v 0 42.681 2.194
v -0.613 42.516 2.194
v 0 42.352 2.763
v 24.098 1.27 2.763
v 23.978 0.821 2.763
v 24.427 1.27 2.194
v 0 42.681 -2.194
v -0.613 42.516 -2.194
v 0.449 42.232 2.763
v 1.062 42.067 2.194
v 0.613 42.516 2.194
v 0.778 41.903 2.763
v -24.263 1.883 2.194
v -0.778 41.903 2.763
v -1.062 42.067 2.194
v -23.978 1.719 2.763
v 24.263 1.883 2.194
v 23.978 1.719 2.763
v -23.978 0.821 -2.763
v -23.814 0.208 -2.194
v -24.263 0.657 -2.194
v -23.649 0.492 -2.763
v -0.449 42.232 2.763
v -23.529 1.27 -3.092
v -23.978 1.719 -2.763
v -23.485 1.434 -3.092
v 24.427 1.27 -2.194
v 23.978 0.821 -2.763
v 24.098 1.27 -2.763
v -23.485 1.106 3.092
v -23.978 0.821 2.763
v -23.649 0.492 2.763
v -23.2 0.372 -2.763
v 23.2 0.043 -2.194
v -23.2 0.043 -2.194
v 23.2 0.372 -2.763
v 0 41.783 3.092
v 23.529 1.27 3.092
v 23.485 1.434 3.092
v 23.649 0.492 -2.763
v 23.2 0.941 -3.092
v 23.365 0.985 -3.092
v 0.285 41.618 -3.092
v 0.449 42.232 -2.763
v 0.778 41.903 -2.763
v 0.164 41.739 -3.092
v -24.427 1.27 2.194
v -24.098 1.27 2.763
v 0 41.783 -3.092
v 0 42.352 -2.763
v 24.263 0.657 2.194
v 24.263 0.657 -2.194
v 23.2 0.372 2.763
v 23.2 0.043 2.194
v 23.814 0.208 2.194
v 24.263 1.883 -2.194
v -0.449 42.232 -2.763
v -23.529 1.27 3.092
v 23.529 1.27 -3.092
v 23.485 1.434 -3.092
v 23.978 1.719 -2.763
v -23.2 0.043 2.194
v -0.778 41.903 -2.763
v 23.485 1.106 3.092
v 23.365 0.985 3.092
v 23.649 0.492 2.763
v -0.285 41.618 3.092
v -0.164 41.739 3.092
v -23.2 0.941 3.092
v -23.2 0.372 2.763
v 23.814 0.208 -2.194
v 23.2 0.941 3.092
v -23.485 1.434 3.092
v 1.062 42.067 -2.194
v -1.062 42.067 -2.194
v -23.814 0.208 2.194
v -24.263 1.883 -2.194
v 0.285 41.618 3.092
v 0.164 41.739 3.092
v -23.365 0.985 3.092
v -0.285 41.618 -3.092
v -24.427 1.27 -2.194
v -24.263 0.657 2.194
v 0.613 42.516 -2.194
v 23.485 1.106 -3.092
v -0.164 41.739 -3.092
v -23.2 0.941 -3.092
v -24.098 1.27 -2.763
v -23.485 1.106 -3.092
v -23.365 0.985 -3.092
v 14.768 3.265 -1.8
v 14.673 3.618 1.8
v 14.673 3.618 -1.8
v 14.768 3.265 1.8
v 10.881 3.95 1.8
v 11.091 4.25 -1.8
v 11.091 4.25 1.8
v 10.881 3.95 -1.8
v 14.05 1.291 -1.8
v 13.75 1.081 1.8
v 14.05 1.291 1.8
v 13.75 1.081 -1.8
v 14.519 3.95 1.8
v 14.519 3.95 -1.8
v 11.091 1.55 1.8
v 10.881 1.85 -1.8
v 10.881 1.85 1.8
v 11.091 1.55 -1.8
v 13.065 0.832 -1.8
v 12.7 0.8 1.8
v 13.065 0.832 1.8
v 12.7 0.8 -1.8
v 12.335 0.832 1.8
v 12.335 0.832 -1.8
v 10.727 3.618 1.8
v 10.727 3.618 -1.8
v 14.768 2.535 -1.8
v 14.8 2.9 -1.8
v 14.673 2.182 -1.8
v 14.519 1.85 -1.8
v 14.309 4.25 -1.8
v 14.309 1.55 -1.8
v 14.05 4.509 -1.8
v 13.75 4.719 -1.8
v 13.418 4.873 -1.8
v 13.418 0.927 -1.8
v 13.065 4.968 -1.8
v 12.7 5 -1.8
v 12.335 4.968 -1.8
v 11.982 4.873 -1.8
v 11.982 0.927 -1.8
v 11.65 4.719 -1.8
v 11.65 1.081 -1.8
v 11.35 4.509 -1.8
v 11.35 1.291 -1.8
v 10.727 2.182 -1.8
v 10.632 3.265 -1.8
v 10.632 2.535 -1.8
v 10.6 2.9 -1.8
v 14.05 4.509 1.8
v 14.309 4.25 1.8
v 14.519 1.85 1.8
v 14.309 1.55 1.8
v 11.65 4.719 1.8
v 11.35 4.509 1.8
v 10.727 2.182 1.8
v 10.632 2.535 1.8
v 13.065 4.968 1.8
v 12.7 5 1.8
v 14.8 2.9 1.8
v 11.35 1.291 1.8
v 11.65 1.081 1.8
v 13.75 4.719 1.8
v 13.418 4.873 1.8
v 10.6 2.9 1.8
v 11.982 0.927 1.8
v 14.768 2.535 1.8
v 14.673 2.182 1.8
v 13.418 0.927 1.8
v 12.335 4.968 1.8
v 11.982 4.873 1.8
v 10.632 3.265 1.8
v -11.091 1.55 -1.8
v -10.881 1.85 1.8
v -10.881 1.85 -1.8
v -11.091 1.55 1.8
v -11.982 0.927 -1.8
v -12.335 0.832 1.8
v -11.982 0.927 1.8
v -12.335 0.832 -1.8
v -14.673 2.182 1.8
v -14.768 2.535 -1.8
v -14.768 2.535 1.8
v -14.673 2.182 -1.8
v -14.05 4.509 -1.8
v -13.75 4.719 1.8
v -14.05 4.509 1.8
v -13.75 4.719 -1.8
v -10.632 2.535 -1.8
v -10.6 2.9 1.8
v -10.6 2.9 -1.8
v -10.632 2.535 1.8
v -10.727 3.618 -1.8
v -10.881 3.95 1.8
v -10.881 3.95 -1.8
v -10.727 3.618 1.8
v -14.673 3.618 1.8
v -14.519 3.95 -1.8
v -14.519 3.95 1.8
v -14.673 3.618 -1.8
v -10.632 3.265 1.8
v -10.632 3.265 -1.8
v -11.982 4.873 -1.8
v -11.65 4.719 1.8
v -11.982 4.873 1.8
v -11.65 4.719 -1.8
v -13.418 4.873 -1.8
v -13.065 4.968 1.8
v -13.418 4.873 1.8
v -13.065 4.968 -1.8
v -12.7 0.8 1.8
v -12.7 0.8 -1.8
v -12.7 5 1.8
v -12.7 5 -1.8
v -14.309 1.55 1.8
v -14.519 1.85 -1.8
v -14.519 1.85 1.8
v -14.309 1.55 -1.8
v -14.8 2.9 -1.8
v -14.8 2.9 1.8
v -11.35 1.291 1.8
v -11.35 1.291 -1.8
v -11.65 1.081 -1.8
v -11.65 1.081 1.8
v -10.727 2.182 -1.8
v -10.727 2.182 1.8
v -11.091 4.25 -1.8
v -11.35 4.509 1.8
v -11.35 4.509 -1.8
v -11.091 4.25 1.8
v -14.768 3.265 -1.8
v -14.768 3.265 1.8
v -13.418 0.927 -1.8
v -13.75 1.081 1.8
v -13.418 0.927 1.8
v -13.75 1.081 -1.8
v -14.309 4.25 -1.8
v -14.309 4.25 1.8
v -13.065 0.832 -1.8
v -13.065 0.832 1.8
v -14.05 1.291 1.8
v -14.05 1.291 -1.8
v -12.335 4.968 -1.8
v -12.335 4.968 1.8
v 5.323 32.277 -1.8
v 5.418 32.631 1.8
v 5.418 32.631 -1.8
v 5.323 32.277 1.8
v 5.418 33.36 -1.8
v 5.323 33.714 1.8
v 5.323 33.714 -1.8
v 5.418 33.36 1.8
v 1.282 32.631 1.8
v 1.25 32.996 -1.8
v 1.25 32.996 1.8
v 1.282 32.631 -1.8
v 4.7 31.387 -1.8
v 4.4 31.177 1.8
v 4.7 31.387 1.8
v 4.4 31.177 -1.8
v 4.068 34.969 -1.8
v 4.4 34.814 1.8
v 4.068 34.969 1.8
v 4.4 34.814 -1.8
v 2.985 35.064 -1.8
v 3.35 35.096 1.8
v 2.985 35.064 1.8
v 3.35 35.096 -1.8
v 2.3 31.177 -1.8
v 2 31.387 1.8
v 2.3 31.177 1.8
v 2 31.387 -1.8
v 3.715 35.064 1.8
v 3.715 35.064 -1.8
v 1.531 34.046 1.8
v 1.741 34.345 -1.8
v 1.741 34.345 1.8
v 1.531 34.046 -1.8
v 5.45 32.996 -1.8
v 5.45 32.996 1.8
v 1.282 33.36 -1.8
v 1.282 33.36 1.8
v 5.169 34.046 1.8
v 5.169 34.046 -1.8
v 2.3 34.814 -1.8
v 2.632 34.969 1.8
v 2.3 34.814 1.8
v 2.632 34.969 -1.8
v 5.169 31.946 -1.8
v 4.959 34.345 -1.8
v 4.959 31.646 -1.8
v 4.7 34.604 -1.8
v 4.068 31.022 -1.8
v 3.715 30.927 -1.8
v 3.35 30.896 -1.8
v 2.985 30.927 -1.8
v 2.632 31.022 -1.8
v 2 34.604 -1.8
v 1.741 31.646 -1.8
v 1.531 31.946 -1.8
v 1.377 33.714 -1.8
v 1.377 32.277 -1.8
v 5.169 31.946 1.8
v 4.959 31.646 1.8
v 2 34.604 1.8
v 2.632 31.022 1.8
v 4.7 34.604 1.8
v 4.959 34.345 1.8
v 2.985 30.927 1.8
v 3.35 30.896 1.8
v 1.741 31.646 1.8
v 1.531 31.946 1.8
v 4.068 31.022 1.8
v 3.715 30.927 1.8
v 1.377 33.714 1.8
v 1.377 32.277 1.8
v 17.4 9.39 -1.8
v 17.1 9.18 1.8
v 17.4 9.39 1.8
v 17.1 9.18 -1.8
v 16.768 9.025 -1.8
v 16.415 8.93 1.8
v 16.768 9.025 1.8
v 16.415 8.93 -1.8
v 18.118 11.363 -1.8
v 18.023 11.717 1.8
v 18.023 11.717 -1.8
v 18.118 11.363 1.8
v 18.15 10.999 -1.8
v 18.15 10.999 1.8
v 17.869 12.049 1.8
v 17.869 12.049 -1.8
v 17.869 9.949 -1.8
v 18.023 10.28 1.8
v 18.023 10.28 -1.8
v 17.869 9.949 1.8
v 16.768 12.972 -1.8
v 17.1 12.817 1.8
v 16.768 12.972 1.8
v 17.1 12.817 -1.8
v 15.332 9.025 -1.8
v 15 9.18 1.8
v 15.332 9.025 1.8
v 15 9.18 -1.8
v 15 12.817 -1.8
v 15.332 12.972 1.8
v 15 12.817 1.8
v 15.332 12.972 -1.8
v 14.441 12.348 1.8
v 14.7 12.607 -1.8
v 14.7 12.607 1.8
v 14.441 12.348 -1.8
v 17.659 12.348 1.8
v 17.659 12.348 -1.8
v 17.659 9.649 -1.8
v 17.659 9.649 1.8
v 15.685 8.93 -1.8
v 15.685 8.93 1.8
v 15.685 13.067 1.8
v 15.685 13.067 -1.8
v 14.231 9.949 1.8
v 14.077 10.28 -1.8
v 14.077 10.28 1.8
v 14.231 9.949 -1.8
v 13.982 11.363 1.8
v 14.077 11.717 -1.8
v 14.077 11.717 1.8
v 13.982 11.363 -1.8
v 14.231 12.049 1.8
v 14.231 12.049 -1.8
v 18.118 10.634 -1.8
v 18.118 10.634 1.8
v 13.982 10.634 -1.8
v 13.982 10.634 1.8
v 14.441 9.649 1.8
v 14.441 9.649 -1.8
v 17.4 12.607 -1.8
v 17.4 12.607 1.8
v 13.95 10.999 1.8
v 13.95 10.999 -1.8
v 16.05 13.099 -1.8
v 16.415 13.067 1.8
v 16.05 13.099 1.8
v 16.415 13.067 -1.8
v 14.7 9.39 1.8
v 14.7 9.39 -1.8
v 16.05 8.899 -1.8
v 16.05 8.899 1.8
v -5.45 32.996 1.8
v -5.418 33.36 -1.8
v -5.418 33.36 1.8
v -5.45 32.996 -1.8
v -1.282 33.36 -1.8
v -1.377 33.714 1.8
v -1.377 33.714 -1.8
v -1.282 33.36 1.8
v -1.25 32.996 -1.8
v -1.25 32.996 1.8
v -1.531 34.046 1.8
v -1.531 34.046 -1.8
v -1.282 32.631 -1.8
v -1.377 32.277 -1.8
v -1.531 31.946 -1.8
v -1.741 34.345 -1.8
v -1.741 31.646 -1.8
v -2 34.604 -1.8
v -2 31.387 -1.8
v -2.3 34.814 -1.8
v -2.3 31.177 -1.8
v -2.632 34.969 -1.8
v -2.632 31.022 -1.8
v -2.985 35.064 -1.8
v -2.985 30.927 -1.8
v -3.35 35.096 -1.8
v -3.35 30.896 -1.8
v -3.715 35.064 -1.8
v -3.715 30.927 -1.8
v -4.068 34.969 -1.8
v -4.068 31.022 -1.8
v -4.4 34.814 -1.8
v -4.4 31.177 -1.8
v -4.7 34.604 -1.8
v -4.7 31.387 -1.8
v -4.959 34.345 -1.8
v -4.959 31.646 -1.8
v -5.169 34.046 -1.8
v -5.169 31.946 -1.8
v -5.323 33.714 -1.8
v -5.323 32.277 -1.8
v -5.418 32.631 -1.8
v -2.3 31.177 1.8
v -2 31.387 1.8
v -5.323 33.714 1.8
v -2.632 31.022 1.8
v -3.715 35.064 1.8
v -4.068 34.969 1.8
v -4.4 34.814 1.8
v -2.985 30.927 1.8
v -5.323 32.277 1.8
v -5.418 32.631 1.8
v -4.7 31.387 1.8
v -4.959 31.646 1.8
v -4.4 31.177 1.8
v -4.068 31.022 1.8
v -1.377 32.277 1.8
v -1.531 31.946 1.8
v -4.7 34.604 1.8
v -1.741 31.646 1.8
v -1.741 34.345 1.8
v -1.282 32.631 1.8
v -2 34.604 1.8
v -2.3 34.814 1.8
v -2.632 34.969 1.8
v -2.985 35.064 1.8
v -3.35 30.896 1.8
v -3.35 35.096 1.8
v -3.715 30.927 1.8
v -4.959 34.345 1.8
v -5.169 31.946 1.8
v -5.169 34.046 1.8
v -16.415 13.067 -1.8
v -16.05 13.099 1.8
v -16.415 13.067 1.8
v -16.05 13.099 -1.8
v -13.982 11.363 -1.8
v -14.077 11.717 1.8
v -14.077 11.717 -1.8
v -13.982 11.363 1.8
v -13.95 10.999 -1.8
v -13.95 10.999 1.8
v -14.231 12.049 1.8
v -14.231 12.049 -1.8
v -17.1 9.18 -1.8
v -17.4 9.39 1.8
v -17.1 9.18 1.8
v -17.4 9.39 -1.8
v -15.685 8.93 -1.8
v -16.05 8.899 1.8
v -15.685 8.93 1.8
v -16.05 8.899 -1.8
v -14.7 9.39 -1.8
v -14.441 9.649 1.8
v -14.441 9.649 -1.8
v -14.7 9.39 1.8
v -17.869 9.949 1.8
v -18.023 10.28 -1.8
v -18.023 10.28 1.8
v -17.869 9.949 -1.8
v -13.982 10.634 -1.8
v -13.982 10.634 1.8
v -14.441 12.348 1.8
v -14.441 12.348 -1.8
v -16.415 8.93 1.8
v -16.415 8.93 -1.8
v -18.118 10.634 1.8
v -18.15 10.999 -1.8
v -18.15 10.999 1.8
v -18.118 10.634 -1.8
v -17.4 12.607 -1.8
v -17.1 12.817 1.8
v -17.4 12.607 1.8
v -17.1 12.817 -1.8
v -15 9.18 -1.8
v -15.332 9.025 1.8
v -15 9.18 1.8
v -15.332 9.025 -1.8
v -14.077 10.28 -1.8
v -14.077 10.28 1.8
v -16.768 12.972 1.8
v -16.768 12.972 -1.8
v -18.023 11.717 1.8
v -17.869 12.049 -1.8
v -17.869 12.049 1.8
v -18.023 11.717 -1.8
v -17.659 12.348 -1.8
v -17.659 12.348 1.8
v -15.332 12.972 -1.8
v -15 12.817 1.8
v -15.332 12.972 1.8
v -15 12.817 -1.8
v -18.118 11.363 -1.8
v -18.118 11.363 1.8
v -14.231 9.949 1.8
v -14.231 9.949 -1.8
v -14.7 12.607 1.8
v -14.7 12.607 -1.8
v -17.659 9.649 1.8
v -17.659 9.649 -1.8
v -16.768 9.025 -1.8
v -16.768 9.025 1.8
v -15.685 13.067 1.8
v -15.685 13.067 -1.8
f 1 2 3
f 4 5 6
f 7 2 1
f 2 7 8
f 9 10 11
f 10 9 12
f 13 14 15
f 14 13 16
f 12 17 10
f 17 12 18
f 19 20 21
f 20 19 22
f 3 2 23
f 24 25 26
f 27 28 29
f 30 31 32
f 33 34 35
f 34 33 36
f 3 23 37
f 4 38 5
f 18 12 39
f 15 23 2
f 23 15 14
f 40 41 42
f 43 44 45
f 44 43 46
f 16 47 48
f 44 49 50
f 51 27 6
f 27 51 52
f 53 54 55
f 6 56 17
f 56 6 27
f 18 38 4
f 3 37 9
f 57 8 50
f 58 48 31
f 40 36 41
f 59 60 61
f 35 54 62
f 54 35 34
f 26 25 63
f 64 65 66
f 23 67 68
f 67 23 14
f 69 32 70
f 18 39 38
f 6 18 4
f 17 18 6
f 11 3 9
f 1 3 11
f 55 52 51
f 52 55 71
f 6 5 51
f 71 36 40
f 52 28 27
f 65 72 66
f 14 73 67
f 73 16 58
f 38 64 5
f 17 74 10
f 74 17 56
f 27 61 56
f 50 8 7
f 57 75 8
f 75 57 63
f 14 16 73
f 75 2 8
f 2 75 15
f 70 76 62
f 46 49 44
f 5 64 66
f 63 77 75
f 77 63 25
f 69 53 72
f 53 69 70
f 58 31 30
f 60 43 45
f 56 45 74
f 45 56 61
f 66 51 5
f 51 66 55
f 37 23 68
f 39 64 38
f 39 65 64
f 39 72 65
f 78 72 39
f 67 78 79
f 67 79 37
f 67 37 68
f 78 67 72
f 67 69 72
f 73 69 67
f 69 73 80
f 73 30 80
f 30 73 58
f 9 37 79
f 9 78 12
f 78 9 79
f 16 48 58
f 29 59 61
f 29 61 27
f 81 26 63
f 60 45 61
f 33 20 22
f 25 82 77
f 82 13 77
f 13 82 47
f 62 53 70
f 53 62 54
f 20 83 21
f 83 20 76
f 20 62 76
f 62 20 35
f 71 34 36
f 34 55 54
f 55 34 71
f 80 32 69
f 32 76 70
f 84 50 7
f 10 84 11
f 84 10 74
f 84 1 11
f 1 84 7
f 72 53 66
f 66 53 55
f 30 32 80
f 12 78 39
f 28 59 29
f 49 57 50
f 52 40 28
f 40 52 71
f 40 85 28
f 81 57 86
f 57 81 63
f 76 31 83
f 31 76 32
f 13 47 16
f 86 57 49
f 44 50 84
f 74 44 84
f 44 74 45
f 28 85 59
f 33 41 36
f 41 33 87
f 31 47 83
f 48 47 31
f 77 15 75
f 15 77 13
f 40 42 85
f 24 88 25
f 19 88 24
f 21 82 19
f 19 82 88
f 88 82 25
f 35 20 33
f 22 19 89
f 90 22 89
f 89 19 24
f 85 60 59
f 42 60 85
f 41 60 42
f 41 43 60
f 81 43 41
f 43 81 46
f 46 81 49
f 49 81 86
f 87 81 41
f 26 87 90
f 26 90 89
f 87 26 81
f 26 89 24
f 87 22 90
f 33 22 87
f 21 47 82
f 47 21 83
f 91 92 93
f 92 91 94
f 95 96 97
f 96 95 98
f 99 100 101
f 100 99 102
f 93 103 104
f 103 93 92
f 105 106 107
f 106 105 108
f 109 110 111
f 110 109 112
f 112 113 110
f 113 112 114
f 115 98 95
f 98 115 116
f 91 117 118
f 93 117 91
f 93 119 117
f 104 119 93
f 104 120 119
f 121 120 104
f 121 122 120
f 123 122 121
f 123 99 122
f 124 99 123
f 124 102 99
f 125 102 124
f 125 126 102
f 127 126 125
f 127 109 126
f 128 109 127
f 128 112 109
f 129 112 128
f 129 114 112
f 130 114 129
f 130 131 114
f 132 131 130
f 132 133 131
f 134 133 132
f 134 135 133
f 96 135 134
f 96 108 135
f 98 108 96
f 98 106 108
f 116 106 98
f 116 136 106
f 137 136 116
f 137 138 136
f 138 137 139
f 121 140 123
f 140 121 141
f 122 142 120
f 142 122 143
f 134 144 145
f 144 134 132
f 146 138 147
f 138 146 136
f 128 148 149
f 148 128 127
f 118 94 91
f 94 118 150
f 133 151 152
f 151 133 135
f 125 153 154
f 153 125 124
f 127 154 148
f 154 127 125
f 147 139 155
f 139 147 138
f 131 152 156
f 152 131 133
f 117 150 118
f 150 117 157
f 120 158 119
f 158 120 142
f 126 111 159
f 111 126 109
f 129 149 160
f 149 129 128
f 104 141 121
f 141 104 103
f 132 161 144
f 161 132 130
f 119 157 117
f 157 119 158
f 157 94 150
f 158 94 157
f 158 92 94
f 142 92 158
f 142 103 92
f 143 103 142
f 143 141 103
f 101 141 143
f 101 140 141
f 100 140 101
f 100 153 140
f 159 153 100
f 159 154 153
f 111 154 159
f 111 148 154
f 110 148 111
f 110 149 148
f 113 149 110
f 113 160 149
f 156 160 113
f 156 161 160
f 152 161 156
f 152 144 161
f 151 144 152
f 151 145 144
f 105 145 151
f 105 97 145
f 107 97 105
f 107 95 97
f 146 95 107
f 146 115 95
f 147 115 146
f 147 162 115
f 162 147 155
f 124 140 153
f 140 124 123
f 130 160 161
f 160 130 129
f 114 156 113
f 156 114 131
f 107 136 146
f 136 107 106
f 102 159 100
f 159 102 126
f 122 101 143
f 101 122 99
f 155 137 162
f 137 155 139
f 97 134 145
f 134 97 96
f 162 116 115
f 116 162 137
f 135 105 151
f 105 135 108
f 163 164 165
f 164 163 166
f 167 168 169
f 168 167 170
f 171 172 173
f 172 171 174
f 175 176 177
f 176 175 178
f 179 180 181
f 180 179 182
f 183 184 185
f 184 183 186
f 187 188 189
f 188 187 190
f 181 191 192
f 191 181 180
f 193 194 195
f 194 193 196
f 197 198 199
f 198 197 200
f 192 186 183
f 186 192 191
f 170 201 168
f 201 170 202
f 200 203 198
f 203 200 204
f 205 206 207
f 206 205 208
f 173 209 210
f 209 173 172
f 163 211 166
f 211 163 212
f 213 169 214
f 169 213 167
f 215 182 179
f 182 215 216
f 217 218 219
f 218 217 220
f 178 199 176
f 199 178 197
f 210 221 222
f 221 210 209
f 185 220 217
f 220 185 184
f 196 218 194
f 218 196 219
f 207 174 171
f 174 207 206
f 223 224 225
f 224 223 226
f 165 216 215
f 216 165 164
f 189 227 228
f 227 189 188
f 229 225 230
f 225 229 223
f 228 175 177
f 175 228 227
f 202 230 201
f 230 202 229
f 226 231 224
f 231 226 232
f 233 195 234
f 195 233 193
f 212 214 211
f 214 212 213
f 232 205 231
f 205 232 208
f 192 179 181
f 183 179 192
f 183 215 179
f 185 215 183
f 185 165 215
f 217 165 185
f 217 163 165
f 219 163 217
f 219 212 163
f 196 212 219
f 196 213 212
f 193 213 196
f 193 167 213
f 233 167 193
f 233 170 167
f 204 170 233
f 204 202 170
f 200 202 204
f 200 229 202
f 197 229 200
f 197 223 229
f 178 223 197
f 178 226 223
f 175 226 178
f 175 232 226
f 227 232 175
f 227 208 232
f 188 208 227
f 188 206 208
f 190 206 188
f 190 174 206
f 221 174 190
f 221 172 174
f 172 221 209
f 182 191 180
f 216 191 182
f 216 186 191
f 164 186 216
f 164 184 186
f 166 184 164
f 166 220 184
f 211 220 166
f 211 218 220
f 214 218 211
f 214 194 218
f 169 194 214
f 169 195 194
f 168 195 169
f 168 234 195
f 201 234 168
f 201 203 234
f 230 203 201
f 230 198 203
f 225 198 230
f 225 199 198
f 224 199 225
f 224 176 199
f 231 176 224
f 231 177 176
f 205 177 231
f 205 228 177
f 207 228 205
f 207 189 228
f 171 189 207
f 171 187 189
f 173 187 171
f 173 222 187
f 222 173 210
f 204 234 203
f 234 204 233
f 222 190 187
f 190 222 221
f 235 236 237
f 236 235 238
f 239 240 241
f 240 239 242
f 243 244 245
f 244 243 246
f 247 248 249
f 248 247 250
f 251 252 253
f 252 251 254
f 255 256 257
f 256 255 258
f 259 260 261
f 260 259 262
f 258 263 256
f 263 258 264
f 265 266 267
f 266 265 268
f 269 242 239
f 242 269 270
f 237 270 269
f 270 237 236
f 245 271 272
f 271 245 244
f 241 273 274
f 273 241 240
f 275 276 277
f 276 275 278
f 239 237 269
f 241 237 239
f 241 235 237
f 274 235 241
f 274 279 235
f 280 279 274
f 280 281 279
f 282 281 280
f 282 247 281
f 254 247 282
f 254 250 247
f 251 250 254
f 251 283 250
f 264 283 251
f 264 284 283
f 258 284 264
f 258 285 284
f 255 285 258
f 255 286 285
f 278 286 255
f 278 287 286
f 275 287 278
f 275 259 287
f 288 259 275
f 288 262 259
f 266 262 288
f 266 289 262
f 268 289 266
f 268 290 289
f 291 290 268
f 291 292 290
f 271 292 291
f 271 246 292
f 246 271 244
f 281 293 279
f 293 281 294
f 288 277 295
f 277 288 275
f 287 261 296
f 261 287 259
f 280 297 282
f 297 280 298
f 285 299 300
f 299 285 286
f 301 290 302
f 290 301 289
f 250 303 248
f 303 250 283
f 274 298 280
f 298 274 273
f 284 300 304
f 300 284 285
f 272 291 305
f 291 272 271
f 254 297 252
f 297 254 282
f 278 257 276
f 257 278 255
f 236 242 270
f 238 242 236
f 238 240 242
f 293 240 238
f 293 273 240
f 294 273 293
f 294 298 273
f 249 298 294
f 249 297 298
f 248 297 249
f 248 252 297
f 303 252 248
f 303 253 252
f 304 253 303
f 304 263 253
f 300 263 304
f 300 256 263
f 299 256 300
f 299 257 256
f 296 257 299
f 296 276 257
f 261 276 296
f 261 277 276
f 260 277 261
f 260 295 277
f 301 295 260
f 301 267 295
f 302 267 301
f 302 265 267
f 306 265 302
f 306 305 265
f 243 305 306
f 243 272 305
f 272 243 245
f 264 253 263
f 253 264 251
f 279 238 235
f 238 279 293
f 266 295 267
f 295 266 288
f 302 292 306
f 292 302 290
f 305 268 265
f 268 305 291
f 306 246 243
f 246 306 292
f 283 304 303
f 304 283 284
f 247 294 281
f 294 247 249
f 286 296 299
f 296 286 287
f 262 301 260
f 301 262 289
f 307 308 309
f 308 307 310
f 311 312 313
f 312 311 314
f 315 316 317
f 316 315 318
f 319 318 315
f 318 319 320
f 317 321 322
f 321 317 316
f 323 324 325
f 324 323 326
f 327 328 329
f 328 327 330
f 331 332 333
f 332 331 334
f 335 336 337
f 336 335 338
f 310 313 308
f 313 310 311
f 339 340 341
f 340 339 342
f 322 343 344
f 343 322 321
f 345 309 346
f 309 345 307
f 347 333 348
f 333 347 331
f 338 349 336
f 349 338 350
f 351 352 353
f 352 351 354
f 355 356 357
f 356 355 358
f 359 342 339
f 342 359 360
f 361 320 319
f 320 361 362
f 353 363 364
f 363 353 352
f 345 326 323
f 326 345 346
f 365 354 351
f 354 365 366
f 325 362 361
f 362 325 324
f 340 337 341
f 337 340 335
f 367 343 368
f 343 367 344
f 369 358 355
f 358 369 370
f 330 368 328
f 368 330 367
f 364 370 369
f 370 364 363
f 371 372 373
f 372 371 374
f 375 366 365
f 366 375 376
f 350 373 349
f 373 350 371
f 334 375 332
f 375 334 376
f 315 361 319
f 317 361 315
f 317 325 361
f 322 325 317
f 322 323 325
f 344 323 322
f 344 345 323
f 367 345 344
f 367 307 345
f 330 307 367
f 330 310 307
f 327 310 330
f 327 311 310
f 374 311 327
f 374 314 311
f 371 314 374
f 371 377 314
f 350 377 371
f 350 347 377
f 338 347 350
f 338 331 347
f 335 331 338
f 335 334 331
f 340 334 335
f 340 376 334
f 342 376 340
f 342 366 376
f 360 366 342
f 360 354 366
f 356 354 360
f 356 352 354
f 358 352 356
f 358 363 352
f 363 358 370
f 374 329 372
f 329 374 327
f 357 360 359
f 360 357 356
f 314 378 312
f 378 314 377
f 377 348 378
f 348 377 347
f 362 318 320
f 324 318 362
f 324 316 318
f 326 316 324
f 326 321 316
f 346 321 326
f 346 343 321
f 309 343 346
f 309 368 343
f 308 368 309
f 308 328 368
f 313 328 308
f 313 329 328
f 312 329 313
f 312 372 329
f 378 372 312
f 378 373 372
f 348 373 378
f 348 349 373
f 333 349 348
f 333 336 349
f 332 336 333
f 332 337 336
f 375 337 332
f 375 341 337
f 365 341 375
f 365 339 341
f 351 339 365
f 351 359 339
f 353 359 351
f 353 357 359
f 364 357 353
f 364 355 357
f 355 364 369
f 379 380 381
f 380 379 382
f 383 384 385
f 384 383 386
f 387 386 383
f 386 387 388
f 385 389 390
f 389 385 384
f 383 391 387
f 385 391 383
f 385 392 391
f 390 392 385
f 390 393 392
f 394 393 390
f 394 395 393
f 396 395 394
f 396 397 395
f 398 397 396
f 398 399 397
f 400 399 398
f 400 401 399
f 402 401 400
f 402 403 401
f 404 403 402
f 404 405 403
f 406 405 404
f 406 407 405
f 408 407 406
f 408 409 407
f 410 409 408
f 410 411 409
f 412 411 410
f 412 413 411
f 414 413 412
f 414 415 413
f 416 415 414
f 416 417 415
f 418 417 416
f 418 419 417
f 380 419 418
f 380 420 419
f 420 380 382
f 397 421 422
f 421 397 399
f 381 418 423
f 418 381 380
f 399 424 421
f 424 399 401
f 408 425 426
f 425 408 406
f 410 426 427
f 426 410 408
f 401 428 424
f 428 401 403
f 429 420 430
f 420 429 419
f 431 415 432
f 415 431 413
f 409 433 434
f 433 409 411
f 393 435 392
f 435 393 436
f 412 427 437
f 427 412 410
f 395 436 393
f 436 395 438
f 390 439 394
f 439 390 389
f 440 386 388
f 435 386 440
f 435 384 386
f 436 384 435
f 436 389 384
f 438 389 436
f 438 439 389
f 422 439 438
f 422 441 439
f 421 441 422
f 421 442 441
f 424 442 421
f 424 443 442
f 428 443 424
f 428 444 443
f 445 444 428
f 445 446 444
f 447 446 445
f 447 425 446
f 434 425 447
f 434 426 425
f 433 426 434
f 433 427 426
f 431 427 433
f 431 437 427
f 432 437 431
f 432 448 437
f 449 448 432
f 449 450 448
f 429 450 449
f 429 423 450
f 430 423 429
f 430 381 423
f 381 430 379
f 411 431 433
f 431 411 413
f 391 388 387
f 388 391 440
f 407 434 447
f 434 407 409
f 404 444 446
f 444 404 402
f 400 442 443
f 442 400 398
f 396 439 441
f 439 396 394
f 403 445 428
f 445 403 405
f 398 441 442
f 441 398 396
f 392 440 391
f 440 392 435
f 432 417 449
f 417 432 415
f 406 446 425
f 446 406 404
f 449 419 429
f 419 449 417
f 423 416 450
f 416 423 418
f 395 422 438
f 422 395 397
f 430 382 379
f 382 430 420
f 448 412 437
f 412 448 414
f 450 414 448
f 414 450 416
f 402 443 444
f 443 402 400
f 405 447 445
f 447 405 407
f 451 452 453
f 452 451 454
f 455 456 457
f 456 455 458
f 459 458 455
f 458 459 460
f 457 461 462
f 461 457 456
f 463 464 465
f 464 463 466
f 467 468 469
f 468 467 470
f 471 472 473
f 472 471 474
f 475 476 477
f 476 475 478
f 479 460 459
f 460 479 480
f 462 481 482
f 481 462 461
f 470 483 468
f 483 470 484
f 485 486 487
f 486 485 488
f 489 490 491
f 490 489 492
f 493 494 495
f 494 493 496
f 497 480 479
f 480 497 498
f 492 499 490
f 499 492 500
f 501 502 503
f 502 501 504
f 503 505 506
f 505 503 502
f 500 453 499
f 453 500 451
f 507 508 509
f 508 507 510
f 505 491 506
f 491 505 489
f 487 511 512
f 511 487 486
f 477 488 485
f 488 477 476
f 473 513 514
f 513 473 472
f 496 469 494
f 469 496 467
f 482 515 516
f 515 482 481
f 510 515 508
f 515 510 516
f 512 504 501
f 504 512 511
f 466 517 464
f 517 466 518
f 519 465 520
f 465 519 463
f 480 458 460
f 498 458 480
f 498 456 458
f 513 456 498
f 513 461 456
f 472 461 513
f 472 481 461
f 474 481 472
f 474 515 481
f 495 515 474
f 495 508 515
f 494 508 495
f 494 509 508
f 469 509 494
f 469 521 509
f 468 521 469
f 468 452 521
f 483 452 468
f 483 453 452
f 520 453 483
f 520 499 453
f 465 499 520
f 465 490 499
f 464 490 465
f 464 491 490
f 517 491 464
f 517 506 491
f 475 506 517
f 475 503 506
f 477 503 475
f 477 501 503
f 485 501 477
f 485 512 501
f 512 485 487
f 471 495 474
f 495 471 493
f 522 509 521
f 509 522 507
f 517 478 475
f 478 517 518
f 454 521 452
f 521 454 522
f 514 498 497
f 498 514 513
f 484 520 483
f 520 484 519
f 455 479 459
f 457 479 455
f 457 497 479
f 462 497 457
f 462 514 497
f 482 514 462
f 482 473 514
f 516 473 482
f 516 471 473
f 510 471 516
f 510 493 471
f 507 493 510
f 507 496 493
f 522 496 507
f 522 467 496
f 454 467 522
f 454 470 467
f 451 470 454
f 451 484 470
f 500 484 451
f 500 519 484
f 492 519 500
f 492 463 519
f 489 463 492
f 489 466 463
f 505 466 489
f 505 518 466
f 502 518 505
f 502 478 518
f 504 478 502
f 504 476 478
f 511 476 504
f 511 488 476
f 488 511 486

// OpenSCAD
// file: cadence.scad
// cadence eaabadf.scad
// https://github.com/jmettraux/cadence.scad


// as of 2019.05, OpenSCAD understands
// is_num, is_list, is_string, and, is_bool
//
// is_function is coming, but looks tricky



function _normalize_angle(a) =
  ((a >= 0 && a <= 360) ? a : _normalize_angle(a + (a < 0 ? 360 : -360)));


function _is_point(p) =
  is_list(p) && len(p) == 3 && is_num(p.x) && is_num(p.y) && is_num(p.z);


//
// dictionary functions

function _aaget(dict, key, default, off) =
  let (kv = dict[off])
    kv == undef ? default :
    kv[0] == key ? kv[1] :
      _aaget(dict, key, default, off + 1);

function _asget(dict, key, default, off) =
  dict[off] == undef ? default :
  dict[off] == key ? dict[off + 1] :
    _asget(dict, key, default, off + 2);

function _get(dict, key, default=undef) =
  is_string(dict[0]) ?
    _asget(dict, key, default, 0) :
    _aaget(dict, key, default, 0);

function _del(dict, key) =
  [ for (kv = dict) if (kv[0] != key) kv ];

function _put(dict, key, value) =
  concat(_del(dict, key), [ [ key, value ] ]);


function _assoc(arr, key, default, off=0) =
  let (a = arr[off])
  a == undef ? default :
  a[0] == key ? a :
  _assoc(arr, key, default, off + 1);

function _app(arr, entry) =
  concat(_del(arr, entry[0]), [ entry ]);


//
// list functions

function _idx(list, index, default=undef) =
  let (
    i = index < 0 ? len(list) + index : index,
    r = list[i]
  )
  r == undef ? default : r;

  // sublist
  //
function _slist(list, from=0, to) =
  let(
    li = len(list) - 1,
    end = (to == undef ? li : to),
    a0 = from < 0 ? li + 1 + from : from,
    a = a0 < 0 ? 0 : a0,
    z = end < 0 ? li + 1 + end : end
  )
    a > li ? [] :
    z < a ? [] :
      [ for (i = [a:z]) list[i] ];

function _reverse(list) =
  [ for (i = [ len(list) - 1 : -1 : 0 ]) list[i] ];


//
// string functions

function _sstr(s, from=0, length=undef, r="") =
  let(
    i = from < 0 ? len(s) + from : from,
    l = length == undef ? len(s) : length,
    s0 = s[i]
  )
  (s0 == undef || l < 1) ? r :
  str(r, s[i], _sstr(s, i + 1, l - 1));

function _sindex(s, s1, i=0) =
  let(
    l = len(s1),
    s0 = _sstr(s, i, l)
  )
  len(s0) < l ? undef :
  s0 == s1 ? i :
  _sindex(s, s1, i + 1);


function _ends_with(l, l1)=
  is_string(l) ? (_sstr(l, len(l) - len(l1)) == l1) :
  is_list(l) ? (_slist(l, len(l) - len(l1)) == l1) :
  false;


//
// point functions

  // Accept a single angle instead of [ angle0, angle1 ]
  // 'sp' is the start point
  //
function _to_point(length, angles, sp=[ 0, 0, 0 ]) =
  let(
    as = is_num(angles) ? [ angles, 0 ] : angles,
    inclination = as[0],
    azimuth = as[1] + 90
  )
    sp + [
      length * cos(inclination) * cos(azimuth),
      length * cos(inclination) * sin(azimuth),
      length * sin(inclination) ];

function _to_spherical(point) =
  let(
    l = norm(point),
    ele = asin(point.z / l),
    dir = atan2(point.y, point.x) - 90
  )
    [ l, [ ele, dir ] ];

function _to_spherical_xyz(point) =
  let(
    l = norm(point),
    ele = asin(point.z / l),
    dir = atan2(point.y, point.x) - 90
  )
    [ l, ele, dir ];

function _to_ele_dir(point) =
  let(
    ele = asin(point.z / l),
    dir = atan2(point.y, point.x) - 90
  )
    [ ele, dir ];


function _midpoint(p0, p1, ratio=0.5) =
  let(
    s = _to_spherical(p1 - p0)
  )
    _to_point(ratio * s[0], s[1], p0);

//function _vlen(vector) =
//  sqrt(pow(vector.x, 2) + pow(vector.y, 2) + pow(vector.z, 2));
  //
  // no, use norm(vector)


// Like rotate(rotation) { x }, but as a function, applied to a single point
//
function rotate_point(point, rotation)=
  let (
    r = rotation,
    m =
      [ [ 1, 0, 0 ], [0, cos(r.x), -sin(r.x) ], [ 0, sin(r.x), cos(r.x) ] ] *
      [ [ cos(r.y), 0, sin(r.y) ], [ 0, 1, 0 ], [ -sin(r.y), 0, cos(r.y) ] ] *
      [ [ cos(r.z), -sin(r.z), 0 ], [ sin(r.z), cos(r.z), 0 ], [ 0, 0, 1 ] ]
  )
  m * point;


// inspiration:
// https://climberg.de/post/openscad_bezier_curves_of_any_degrees

function _bezier_choose(n, k) =
  k == 0 ?  1 : (n * _bezier_choose(n - 1, k - 1)) / k;

function _bezier_point(points, t, i, c) =
  len(points) == i ?
    c :
    _bezier_point(
      points,
      t,
      i + 1,
      c +
        _bezier_choose(len(points) - 1, i) *
        pow(t, i) *
        pow(1 - t, len(points) - i - 1) * points[i]);

function _bezier_points(control_points, sample_count) =
  [ for (t = [ 0 : 1.0 / sample_count : 1 ])
    _bezier_point(control_points, t, 0, [ 0, 0, 0 ]) ];


//
// modules

module polypoints(points) {

  for (i = [ 0 : len(points) - 1 ]) {
    translate(points[i]) children(i % $children);
  }
}

module polyhulls(points) {

  for (i = [ 0 : len(points) - 2 ]) {

    hull() {
      translate(points[i]) children(i % $children);
      translate(points[i + 1]) children((i + 1) % $children);
    }
  }
}


// pineapple slice
//
module paslice(radius, depth, slice=45, radius1=0) {

  s = _normalize_angle(slice);
  r = radius;

  if (s > 0) difference() {

    cylinder(depth, r=r);

    translate([ 0, 0, -0.1 ]) cylinder(depth * 1.1, r=radius1);

    if (s != 360) {

      pas = [
        [ 0, r ], [ 0, 0 ] ];
      pbs = [
        [ r, r ], [ r, 0 ], [ r, -r ], [ 0, -r ], [ -r, -r ], [ -r, 0 ],
        [ -r, r ] ];

      t = tan(s);
      tx = t * r;
      ty = r / t;

      translate([ 0, 0, -0.1 ]) linear_extrude(depth + 0.2)
        if (s <= 45)
          polygon(concat(pas, [ [ tx, r ] ], pbs));
        else if (s <= 135)
          polygon(concat(pas, [ [ r, ty ] ], _slist(pbs, 2)));
        else if (s <= 225)
          polygon(concat(pas, [ [ -tx, -r ] ], _slist(pbs, 4)));
        else if (s <= 315)
          polygon(concat(pas, [ [ -r, -ty ] ], _slist(pbs, 6)));
        else if (s < 360)
          polygon(concat(pas, [ [ tx, r ] ]));
    }
  }
}


// dome with optional trunk_height
//
module dome(radius=-1, diameter=-1, trunk_height=0) {

  r = radius < 0 ? diameter / 2 : radius;
  th = trunk_height;

  translate([ 0, 0, th ])
    difference() {
      sphere(r=r);
      translate([ 0, 0, -r ]) cube(2 * r, center=true);
    }
  translate([ 0, 0, th / 2 ])
    cylinder(r=r, h=th, center=true);
}
// main file
//
// house2.scad
//

use <cadence.scad>;

// unit is mm

inch = 25.4;
br = 1.7; // ball radius
o2 = 0.2;
h = 5; // height unit
sr = inch / 20; // sphe radius


module sphe() { sphere(r=sr, $fn=12); }

module balcyl(deeper=false) {

  hf =
    is_num(deeper) ? deeper :
    deeper == true ? 2.8 :
    2;
  h = br * hf + o2;

  dz = hf > 2 ? -3 * o2 : 0;

  translate([ 0, 0, dz ])
    cylinder(r=br + 2 * o2, h=h, center=true, $fn=36);
}


module awall(base, side) {

  b2 = base / 2;
  atop = asin(b2 / side);
  abase = (180 - atop * 2) / 2;
  height = b2 / tan(atop);

  echo("atop", atop, "abase", abase, "total", 2 * atop + 2 * abase);

  //echo("awall height ft", height / inch * 5);
  //echo("awall height", height);

  a14 = cos(atop) * 0.5 * (side - inch);
  a34 = cos(atop) * 0.5 * (side + inch);
  o14 = sin(atop) * 0.5 * (side - inch);
  o34 = sin(atop) * 0.5 * (side + inch);

  //echo("awall side a14 a34", side, a14, a34);
  //echo("awall side o14 o34", side, o14, o34);

  d0 = br + 6 * o2;
  d1 = br + 6.5 * o2;

  h0 = -0.5 * h + sr / 2;
  h1 = 0.5 * h - sr / 2;
  //echo("h0", h0, "h1", h1);

  difference() {

    //%translate([ 0, 0, -0.5 * h ])
    //  linear_extrude(h)
    //    polygon([ [ -b2, 0 ], [ b2, 0 ], [ 0, height ] ]);
    hull() {
      dx = sr / tan(abase / 2);
      dy = sr / sin(atop);
      for (h = [ h0, h1 ]) {
        translate([ b2 - dx, sr, h ]) sphe();
        translate([ -b2 + dx, sr, h ]) sphe();
        translate([ 0, height - dy, h ]) sphe();
      }
    }

    translate([ 0.25 * base, d0, 0 ]) balcyl();
    translate([ -0.25 * base, d0, 0 ]) balcyl();

    translate([ o14 - d1, height - a14, 0 ]) balcyl();
    translate([ o34 - d1, height - a34, 0 ]) balcyl();

    translate([ -o14 + d1, height - a14, 0 ]) balcyl();
    translate([ -o34 + d1, height - a34, 0 ]) balcyl();
  }
}

awall(2 * inch, 2 * inch);


module plank(width, length) {

  w2 = width / 2;
  l2 = length / 2;

  hei = 1 * h;

  h0 = -0.5 * h + sr / 2;
  h1 = 0.5 * h - sr / 2;
  //echo("h0", h0, "h1", h1);

  %hull() {

    for (h = [ h0, h1 ]) {
      translate([ w2, -l2, h ]) sphe();
      translate([ -w2, -l2, h ]) sphe();
      translate([ w2, l2, h ]) sphe();
      translate([ -w2, l2, h ]) sphe();
    }
  }
}

//plank(3 * inch, 4 * inch);
